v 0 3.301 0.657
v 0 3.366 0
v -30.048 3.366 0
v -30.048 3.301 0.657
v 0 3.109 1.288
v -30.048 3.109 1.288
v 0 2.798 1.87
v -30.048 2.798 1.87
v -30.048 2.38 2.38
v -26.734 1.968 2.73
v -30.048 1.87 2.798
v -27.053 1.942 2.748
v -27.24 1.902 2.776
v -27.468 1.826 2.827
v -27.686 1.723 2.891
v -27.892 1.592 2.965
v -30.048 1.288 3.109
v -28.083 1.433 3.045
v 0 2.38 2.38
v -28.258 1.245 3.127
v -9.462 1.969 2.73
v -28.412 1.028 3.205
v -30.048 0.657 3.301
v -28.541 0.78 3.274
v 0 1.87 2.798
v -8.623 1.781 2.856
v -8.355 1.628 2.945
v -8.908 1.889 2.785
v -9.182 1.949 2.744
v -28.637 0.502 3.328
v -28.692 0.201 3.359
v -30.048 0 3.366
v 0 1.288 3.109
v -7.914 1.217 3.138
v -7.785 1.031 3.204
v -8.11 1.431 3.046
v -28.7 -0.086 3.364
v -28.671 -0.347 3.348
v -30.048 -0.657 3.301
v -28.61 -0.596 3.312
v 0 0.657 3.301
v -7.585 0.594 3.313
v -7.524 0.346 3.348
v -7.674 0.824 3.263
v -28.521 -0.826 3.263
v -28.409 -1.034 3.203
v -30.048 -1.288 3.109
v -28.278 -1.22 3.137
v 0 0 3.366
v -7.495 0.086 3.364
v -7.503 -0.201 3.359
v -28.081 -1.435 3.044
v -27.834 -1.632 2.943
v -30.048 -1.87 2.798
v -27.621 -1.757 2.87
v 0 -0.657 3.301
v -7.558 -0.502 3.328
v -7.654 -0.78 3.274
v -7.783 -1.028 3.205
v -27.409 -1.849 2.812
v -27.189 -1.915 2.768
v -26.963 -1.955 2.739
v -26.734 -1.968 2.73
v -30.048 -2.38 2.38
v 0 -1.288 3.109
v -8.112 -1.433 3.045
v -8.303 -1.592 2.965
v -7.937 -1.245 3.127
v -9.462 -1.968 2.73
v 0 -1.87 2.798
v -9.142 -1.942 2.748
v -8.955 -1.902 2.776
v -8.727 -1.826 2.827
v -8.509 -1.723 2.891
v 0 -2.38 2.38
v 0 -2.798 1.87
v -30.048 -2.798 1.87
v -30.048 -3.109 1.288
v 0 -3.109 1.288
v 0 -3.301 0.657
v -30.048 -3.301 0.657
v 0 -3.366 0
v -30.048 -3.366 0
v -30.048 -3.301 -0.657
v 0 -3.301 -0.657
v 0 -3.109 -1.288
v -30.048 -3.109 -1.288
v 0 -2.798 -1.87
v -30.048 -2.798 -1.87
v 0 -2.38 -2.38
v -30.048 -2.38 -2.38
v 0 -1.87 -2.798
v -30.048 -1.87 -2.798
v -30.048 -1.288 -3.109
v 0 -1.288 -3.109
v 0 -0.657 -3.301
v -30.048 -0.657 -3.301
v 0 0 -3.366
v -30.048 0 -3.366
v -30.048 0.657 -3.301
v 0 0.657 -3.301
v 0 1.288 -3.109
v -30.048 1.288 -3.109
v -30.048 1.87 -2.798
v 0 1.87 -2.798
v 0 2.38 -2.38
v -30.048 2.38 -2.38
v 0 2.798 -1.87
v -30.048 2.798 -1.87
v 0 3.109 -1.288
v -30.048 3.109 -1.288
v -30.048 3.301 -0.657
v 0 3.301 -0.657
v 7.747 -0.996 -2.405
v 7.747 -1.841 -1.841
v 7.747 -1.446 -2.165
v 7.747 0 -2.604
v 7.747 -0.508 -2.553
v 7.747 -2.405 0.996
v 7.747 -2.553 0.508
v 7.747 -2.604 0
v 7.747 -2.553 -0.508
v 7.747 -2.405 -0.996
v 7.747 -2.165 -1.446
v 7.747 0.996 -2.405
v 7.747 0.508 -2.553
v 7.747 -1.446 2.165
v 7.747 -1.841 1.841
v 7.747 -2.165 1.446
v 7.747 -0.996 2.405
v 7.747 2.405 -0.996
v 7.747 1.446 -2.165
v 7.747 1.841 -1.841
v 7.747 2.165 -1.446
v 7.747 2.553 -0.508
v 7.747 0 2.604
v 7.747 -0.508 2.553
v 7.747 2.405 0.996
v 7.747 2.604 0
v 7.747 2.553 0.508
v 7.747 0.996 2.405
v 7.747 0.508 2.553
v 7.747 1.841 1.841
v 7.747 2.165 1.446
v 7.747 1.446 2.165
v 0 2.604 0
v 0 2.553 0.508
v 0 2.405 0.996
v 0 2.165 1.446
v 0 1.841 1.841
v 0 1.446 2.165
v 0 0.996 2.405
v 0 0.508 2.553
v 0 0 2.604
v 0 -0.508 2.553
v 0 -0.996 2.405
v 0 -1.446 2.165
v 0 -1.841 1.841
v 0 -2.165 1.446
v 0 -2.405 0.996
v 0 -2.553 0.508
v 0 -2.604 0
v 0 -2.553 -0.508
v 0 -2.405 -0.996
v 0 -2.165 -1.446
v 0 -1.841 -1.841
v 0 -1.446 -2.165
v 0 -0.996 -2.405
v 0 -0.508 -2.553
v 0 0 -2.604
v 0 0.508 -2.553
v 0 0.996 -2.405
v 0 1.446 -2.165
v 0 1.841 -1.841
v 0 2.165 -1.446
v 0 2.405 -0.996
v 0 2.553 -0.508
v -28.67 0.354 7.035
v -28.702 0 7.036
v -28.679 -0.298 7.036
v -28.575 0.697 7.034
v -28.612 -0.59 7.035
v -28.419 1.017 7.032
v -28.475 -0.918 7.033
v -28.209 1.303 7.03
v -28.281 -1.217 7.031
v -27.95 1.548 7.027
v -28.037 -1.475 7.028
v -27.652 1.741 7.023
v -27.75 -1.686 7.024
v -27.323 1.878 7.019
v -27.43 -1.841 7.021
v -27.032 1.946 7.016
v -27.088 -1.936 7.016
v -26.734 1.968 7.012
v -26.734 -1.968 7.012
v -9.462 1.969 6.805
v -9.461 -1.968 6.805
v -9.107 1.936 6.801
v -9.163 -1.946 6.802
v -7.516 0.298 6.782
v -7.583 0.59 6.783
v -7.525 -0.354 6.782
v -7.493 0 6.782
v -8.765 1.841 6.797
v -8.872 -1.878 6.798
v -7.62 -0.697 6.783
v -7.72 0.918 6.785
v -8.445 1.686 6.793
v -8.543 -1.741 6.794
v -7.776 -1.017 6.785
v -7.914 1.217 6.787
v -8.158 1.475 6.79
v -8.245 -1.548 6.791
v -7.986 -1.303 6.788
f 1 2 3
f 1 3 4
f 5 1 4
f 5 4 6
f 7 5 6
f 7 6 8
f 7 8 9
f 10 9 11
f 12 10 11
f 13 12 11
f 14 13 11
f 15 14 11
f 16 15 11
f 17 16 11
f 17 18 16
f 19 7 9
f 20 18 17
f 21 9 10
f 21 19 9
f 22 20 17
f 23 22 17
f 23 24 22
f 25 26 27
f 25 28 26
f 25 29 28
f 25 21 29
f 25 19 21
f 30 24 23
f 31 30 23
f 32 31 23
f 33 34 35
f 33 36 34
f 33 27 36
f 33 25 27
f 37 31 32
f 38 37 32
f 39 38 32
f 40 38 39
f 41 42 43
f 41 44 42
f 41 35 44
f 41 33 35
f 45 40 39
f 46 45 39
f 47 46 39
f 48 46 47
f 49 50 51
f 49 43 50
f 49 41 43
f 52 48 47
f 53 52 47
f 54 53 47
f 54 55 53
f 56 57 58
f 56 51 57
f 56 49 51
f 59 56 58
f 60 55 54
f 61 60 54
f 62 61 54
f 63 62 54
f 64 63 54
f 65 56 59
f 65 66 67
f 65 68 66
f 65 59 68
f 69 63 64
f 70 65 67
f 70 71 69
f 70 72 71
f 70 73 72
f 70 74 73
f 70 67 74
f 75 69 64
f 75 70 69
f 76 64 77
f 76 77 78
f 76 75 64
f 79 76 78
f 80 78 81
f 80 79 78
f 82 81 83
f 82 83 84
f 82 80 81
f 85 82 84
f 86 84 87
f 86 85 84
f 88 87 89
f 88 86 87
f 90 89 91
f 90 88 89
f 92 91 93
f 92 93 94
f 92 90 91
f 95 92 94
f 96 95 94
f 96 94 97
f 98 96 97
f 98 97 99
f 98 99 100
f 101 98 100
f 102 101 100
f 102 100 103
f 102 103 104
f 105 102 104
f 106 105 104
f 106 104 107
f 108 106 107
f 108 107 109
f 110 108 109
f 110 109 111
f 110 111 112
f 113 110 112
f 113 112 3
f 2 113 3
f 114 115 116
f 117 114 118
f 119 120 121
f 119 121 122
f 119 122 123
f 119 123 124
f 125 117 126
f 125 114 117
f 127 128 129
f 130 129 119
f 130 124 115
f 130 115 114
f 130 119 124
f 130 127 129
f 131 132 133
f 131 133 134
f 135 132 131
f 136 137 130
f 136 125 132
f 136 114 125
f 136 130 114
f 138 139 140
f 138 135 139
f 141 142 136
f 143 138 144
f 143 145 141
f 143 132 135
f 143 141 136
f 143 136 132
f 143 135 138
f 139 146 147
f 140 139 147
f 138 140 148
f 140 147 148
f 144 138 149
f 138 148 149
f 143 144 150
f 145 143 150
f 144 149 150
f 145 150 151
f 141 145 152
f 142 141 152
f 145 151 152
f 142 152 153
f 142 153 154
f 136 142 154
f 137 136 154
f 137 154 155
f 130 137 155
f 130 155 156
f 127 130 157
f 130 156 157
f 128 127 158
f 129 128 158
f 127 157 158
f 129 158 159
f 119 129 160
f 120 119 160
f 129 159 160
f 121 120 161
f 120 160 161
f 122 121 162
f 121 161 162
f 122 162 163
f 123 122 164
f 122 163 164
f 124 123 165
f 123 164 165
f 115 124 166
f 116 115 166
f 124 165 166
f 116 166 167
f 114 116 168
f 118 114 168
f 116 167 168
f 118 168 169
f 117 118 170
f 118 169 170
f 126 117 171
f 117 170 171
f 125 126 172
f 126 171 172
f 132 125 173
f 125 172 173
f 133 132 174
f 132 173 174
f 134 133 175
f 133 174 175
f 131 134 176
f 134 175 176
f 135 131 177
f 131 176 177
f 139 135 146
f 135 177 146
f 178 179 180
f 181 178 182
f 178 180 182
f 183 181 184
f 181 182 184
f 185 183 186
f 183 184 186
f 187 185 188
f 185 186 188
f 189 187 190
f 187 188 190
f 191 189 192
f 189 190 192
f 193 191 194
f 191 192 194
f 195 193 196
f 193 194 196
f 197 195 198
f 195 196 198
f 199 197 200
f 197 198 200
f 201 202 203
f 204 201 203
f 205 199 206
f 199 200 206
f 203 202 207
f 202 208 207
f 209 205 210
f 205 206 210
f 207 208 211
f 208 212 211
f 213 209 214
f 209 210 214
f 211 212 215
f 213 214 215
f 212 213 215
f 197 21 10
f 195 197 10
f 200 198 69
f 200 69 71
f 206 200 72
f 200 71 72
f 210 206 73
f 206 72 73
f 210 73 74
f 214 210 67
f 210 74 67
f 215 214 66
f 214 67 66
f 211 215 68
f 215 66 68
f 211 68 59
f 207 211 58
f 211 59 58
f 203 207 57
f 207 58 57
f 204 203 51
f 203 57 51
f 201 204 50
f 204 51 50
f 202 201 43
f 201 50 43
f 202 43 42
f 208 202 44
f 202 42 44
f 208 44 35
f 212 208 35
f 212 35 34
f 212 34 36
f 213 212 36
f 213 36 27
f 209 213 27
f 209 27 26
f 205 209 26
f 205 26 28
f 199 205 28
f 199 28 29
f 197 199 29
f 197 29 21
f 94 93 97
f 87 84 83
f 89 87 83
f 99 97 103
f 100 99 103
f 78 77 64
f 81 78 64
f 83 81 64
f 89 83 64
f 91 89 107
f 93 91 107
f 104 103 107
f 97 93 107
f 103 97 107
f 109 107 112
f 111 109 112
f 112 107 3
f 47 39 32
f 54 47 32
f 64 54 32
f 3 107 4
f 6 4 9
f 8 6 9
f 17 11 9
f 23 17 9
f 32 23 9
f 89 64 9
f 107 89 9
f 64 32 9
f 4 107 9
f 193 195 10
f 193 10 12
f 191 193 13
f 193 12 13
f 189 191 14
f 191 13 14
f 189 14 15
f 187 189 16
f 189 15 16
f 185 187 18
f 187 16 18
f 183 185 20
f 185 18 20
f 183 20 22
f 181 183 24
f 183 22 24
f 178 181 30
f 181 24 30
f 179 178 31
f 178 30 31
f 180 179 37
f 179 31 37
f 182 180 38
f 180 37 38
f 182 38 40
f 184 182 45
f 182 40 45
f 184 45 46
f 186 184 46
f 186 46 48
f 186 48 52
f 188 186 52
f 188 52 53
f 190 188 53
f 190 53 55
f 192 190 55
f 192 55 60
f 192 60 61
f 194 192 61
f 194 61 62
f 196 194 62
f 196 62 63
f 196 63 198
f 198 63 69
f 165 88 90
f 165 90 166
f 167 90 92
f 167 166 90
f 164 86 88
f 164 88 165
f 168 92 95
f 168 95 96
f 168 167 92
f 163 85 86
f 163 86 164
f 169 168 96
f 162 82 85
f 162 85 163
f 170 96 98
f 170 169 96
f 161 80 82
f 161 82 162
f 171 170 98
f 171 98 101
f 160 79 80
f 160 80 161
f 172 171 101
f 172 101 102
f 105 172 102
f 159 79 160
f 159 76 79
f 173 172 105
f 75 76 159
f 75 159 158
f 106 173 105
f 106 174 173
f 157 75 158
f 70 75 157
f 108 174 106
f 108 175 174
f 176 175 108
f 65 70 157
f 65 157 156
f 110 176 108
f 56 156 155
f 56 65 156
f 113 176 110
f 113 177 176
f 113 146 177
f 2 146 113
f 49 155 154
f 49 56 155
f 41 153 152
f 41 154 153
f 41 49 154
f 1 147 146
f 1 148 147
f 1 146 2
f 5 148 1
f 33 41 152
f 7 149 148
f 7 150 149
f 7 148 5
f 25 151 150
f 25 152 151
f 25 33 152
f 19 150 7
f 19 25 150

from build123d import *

# Parameters (mm, degrees)
F0_R     = 3.3655
F1_DEPTH = 30.0482
F2_R     = 2.6035
F3_DEPTH = 7.747
F5_DEPTH = 7.0358
F7_DEPTH = 5.335


with BuildPart() as f1:
    # F0 (on Right) → F1 (new body)
    with BuildSketch(Plane.YZ):
        Circle(F0_R)
    extrude(amount=-F1_DEPTH)

    # F2 (on face) → F3 (join)
    with BuildSketch(Plane.YZ):
        Circle(F2_R)
    extrude(amount=F3_DEPTH)

    # F4 (on Top) → F5 (join)
    with BuildSketch(Plane.XY):
        with BuildLine():
            Line((-9.4615, 1.9685), (-26.7335, 1.9685))
            ThreePointArc((-26.7335, 1.9685), (-28.702, 0), (-26.7335, -1.9685))
            Line((-26.7335, -1.9685), (-9.4615, -1.9685))
            ThreePointArc((-9.4615, -1.9685), (-7.493, 0), (-9.4615, 1.9685))
        make_face()
    extrude(amount=F5_DEPTH)

    # F6 (on face) → F7 (cut, through all)
    with BuildSketch(Plane.XZ.offset(1.9685)):
        Polygon((-7.493, 7.0358), (-28.702, 7.0358), (-7.493, 6.7818), align=None)
    extrude(amount=-F7_DEPTH, mode=Mode.SUBTRACT)


solid = f1.part
